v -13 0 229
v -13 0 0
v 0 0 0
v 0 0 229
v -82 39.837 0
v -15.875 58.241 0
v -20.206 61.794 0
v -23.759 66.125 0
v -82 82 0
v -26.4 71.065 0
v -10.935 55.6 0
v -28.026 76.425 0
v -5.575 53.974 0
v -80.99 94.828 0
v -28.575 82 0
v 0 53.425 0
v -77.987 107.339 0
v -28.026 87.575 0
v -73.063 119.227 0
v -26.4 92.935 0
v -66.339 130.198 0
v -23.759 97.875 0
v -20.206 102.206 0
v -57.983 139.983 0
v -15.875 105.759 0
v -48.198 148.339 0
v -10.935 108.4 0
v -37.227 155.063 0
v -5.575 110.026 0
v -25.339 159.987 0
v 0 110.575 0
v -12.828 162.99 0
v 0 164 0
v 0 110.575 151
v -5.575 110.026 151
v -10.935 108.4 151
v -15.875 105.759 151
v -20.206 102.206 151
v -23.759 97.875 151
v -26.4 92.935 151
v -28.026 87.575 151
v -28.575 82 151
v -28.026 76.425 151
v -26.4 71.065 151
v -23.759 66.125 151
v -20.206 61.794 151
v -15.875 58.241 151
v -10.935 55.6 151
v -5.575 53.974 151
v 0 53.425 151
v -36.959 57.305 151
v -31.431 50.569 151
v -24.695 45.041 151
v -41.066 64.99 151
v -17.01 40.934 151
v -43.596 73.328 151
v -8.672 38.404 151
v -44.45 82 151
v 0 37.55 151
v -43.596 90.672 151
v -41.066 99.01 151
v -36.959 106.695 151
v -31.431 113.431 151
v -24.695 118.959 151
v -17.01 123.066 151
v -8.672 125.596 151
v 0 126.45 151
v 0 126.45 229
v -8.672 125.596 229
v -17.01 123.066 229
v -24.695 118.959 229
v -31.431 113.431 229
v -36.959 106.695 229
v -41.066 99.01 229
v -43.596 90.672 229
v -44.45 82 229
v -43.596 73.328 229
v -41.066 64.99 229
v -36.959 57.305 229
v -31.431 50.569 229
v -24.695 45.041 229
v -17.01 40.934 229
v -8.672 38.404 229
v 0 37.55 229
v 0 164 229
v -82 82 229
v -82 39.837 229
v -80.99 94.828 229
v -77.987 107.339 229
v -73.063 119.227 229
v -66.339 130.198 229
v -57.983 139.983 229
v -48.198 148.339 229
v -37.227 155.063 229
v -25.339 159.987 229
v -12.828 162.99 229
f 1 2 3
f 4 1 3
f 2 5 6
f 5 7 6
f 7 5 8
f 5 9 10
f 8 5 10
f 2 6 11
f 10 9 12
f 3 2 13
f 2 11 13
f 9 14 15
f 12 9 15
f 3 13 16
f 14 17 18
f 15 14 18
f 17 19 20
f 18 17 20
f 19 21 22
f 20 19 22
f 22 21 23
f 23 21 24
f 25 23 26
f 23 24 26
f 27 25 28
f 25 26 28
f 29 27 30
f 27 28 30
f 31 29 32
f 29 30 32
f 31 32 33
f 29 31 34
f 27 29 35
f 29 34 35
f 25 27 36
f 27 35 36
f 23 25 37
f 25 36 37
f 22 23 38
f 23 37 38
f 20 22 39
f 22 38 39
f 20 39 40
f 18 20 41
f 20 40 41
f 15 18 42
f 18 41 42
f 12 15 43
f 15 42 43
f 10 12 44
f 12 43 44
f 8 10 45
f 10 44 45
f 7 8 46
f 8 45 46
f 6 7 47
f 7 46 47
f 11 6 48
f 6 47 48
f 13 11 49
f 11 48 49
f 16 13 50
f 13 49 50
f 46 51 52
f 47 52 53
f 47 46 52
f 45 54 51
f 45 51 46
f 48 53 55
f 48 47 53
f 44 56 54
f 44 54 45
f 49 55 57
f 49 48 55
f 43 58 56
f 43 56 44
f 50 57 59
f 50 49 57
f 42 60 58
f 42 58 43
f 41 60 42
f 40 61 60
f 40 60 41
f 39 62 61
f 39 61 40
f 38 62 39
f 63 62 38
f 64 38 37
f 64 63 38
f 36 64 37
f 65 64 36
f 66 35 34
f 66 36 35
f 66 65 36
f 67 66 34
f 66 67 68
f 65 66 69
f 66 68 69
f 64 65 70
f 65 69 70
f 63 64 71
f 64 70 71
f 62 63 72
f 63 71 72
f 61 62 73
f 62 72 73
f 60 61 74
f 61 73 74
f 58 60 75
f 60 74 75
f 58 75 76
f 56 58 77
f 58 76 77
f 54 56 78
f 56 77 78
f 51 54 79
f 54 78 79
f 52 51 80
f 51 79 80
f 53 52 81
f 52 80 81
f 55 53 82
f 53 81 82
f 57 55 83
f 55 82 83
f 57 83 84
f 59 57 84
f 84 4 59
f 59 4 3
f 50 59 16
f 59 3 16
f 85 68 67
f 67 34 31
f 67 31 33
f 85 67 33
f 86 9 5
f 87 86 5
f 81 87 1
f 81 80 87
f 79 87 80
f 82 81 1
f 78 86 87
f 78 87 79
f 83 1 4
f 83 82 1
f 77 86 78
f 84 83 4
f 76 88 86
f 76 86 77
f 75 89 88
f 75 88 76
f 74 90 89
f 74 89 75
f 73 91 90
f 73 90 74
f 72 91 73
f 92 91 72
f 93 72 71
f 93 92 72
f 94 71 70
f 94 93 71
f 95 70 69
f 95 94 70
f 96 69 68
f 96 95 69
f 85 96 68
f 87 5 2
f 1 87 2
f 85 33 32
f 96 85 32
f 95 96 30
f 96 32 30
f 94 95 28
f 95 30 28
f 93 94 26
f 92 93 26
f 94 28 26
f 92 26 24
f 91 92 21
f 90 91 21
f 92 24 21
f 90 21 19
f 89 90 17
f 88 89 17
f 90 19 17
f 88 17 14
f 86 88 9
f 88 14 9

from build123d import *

# Parameters (mm, degrees)
BOSS_EXTRUDE1_DEPTH = 229
SKETCH3_R           = 44.45
CUT_EXTRUDE1_DEPTH  = 78
SKETCH4_R           = 28.575
CUT_EXTRUDE2_DEPTH  = 238.531050602


with BuildPart() as part:
    # Sketch2 → Boss-Extrude1 (new body)
    with BuildSketch(Plane.XY):
        with BuildLine():
            Line((0, 0), (0, 164))
            ThreePointArc((0, 164), (-57.982756057, 139.982756057), (-82, 82))
            Line((-82, 82), (-82, 39.837168574))
            Line((-82, 39.837168574), (-13, 0))
            Line((-13, 0), (0, 0))
        make_face()
    extrude(amount=BOSS_EXTRUDE1_DEPTH)

    # Sketch3 → Cut-Extrude1 (cut)
    with BuildSketch(Plane.XY.offset(229)):
        with Locations((0, 82)):
            Circle(SKETCH3_R)
    extrude(amount=-CUT_EXTRUDE1_DEPTH, mode=Mode.SUBTRACT)

    # Sketch4 → Cut-Extrude2 (cut, through all)
    with BuildSketch(Plane.XY.offset(151)):
        with Locations((0, 82)):
            Circle(SKETCH4_R)
    extrude(amount=-CUT_EXTRUDE2_DEPTH, mode=Mode.SUBTRACT)


solid = part.part
